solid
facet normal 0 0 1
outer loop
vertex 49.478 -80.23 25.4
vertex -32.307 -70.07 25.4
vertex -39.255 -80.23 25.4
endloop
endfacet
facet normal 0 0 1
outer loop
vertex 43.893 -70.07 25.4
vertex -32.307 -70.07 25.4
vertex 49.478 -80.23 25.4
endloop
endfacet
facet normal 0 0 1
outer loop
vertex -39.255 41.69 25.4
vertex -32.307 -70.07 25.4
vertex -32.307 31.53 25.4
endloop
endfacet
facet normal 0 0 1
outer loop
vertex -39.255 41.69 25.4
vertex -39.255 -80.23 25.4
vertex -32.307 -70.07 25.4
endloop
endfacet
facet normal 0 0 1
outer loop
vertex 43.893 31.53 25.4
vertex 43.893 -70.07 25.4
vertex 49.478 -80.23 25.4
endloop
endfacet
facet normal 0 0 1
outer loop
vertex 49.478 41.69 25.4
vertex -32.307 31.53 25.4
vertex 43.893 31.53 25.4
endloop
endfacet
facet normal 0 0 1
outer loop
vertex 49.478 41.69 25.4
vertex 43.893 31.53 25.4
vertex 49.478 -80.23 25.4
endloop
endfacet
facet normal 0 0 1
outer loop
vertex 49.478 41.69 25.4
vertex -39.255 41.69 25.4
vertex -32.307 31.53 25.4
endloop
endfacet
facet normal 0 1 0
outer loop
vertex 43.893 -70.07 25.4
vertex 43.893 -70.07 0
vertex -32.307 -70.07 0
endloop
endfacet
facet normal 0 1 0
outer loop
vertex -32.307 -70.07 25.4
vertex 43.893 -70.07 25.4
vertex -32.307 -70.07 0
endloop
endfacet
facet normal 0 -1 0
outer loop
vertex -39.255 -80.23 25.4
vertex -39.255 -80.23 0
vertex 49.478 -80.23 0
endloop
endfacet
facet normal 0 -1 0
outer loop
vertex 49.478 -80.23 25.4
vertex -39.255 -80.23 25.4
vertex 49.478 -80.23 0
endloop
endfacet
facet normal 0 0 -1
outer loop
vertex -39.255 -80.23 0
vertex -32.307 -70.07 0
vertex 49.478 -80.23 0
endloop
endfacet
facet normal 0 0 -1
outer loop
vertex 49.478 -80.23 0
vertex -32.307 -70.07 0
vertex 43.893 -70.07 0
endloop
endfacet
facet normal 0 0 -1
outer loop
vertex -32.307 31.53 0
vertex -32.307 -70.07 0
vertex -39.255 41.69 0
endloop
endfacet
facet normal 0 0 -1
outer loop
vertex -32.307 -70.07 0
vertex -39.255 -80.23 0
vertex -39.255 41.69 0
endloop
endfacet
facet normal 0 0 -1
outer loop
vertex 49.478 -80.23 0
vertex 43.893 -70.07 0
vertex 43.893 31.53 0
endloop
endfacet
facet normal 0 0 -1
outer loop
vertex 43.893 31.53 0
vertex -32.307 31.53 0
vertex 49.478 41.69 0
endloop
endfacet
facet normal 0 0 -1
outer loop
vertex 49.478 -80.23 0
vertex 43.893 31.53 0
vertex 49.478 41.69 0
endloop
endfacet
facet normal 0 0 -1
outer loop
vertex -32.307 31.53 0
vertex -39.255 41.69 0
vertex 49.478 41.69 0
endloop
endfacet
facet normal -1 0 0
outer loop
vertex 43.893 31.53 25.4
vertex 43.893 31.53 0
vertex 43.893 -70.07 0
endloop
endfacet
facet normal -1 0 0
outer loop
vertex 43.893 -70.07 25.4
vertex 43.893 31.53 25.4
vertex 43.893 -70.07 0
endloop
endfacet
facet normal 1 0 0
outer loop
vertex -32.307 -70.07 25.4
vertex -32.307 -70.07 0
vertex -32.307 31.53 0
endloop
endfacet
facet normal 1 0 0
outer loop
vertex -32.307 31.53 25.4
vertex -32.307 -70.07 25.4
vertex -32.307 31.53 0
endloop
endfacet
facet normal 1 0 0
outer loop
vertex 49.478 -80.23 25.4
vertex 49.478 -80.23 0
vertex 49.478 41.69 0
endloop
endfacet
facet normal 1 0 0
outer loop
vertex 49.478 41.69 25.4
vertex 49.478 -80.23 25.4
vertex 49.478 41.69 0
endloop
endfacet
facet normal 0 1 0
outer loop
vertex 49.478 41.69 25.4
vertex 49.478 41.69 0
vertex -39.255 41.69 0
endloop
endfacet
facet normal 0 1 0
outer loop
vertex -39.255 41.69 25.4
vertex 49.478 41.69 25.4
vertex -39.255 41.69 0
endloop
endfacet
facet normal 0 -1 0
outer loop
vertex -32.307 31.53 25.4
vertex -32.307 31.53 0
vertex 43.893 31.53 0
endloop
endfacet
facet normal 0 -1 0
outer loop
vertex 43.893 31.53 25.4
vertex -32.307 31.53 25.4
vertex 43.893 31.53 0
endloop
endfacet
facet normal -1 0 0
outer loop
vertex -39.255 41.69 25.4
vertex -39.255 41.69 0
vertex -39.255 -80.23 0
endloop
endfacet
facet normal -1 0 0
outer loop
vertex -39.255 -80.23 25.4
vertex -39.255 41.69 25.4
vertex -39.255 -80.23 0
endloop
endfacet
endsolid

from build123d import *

# Parameters (mm, degrees)
F0_W     = 76.2
F0_H     = 10.16
F1_DEPTH = 25.4
F0_W_2   = 5.584522
F0_H_2   = 101.6
F2_DEPTH = 25.4


with BuildPart() as f1:
    # F0 (on Top) → F1 (new body)
    with BuildSketch(Plane.XY):
        with Locations((5.793286, 36.60981)):
            Rectangle(F0_W, F0_H)
    extrude(amount=F1_DEPTH)

    # F0 (on Top) → F2 (join)
    with BuildSketch(Plane.XY):
        Polygon((-32.306714, -70.07019), (-32.306714, 31.52981), (-32.306714, 41.68981), (-39.255086, 41.68981), (-39.255086, -70.07019), align=None)
        with Locations((46.685547, -19.27019)):
            Rectangle(F0_W_2, F0_H_2)
        with Locations((46.685547, 36.60981)):
            Rectangle(F0_W_2, F0_H)
        with Locations((46.685547, -75.15019)):
            Rectangle(F0_W_2, F0_H)
        Polygon((43.893286, -80.23019), (43.893286, -70.07019), (-32.306714, -70.07019), (-39.255086, -70.07019), (-39.255086, -80.23019), align=None)
    extrude(amount=F2_DEPTH)


solid = f1.part
